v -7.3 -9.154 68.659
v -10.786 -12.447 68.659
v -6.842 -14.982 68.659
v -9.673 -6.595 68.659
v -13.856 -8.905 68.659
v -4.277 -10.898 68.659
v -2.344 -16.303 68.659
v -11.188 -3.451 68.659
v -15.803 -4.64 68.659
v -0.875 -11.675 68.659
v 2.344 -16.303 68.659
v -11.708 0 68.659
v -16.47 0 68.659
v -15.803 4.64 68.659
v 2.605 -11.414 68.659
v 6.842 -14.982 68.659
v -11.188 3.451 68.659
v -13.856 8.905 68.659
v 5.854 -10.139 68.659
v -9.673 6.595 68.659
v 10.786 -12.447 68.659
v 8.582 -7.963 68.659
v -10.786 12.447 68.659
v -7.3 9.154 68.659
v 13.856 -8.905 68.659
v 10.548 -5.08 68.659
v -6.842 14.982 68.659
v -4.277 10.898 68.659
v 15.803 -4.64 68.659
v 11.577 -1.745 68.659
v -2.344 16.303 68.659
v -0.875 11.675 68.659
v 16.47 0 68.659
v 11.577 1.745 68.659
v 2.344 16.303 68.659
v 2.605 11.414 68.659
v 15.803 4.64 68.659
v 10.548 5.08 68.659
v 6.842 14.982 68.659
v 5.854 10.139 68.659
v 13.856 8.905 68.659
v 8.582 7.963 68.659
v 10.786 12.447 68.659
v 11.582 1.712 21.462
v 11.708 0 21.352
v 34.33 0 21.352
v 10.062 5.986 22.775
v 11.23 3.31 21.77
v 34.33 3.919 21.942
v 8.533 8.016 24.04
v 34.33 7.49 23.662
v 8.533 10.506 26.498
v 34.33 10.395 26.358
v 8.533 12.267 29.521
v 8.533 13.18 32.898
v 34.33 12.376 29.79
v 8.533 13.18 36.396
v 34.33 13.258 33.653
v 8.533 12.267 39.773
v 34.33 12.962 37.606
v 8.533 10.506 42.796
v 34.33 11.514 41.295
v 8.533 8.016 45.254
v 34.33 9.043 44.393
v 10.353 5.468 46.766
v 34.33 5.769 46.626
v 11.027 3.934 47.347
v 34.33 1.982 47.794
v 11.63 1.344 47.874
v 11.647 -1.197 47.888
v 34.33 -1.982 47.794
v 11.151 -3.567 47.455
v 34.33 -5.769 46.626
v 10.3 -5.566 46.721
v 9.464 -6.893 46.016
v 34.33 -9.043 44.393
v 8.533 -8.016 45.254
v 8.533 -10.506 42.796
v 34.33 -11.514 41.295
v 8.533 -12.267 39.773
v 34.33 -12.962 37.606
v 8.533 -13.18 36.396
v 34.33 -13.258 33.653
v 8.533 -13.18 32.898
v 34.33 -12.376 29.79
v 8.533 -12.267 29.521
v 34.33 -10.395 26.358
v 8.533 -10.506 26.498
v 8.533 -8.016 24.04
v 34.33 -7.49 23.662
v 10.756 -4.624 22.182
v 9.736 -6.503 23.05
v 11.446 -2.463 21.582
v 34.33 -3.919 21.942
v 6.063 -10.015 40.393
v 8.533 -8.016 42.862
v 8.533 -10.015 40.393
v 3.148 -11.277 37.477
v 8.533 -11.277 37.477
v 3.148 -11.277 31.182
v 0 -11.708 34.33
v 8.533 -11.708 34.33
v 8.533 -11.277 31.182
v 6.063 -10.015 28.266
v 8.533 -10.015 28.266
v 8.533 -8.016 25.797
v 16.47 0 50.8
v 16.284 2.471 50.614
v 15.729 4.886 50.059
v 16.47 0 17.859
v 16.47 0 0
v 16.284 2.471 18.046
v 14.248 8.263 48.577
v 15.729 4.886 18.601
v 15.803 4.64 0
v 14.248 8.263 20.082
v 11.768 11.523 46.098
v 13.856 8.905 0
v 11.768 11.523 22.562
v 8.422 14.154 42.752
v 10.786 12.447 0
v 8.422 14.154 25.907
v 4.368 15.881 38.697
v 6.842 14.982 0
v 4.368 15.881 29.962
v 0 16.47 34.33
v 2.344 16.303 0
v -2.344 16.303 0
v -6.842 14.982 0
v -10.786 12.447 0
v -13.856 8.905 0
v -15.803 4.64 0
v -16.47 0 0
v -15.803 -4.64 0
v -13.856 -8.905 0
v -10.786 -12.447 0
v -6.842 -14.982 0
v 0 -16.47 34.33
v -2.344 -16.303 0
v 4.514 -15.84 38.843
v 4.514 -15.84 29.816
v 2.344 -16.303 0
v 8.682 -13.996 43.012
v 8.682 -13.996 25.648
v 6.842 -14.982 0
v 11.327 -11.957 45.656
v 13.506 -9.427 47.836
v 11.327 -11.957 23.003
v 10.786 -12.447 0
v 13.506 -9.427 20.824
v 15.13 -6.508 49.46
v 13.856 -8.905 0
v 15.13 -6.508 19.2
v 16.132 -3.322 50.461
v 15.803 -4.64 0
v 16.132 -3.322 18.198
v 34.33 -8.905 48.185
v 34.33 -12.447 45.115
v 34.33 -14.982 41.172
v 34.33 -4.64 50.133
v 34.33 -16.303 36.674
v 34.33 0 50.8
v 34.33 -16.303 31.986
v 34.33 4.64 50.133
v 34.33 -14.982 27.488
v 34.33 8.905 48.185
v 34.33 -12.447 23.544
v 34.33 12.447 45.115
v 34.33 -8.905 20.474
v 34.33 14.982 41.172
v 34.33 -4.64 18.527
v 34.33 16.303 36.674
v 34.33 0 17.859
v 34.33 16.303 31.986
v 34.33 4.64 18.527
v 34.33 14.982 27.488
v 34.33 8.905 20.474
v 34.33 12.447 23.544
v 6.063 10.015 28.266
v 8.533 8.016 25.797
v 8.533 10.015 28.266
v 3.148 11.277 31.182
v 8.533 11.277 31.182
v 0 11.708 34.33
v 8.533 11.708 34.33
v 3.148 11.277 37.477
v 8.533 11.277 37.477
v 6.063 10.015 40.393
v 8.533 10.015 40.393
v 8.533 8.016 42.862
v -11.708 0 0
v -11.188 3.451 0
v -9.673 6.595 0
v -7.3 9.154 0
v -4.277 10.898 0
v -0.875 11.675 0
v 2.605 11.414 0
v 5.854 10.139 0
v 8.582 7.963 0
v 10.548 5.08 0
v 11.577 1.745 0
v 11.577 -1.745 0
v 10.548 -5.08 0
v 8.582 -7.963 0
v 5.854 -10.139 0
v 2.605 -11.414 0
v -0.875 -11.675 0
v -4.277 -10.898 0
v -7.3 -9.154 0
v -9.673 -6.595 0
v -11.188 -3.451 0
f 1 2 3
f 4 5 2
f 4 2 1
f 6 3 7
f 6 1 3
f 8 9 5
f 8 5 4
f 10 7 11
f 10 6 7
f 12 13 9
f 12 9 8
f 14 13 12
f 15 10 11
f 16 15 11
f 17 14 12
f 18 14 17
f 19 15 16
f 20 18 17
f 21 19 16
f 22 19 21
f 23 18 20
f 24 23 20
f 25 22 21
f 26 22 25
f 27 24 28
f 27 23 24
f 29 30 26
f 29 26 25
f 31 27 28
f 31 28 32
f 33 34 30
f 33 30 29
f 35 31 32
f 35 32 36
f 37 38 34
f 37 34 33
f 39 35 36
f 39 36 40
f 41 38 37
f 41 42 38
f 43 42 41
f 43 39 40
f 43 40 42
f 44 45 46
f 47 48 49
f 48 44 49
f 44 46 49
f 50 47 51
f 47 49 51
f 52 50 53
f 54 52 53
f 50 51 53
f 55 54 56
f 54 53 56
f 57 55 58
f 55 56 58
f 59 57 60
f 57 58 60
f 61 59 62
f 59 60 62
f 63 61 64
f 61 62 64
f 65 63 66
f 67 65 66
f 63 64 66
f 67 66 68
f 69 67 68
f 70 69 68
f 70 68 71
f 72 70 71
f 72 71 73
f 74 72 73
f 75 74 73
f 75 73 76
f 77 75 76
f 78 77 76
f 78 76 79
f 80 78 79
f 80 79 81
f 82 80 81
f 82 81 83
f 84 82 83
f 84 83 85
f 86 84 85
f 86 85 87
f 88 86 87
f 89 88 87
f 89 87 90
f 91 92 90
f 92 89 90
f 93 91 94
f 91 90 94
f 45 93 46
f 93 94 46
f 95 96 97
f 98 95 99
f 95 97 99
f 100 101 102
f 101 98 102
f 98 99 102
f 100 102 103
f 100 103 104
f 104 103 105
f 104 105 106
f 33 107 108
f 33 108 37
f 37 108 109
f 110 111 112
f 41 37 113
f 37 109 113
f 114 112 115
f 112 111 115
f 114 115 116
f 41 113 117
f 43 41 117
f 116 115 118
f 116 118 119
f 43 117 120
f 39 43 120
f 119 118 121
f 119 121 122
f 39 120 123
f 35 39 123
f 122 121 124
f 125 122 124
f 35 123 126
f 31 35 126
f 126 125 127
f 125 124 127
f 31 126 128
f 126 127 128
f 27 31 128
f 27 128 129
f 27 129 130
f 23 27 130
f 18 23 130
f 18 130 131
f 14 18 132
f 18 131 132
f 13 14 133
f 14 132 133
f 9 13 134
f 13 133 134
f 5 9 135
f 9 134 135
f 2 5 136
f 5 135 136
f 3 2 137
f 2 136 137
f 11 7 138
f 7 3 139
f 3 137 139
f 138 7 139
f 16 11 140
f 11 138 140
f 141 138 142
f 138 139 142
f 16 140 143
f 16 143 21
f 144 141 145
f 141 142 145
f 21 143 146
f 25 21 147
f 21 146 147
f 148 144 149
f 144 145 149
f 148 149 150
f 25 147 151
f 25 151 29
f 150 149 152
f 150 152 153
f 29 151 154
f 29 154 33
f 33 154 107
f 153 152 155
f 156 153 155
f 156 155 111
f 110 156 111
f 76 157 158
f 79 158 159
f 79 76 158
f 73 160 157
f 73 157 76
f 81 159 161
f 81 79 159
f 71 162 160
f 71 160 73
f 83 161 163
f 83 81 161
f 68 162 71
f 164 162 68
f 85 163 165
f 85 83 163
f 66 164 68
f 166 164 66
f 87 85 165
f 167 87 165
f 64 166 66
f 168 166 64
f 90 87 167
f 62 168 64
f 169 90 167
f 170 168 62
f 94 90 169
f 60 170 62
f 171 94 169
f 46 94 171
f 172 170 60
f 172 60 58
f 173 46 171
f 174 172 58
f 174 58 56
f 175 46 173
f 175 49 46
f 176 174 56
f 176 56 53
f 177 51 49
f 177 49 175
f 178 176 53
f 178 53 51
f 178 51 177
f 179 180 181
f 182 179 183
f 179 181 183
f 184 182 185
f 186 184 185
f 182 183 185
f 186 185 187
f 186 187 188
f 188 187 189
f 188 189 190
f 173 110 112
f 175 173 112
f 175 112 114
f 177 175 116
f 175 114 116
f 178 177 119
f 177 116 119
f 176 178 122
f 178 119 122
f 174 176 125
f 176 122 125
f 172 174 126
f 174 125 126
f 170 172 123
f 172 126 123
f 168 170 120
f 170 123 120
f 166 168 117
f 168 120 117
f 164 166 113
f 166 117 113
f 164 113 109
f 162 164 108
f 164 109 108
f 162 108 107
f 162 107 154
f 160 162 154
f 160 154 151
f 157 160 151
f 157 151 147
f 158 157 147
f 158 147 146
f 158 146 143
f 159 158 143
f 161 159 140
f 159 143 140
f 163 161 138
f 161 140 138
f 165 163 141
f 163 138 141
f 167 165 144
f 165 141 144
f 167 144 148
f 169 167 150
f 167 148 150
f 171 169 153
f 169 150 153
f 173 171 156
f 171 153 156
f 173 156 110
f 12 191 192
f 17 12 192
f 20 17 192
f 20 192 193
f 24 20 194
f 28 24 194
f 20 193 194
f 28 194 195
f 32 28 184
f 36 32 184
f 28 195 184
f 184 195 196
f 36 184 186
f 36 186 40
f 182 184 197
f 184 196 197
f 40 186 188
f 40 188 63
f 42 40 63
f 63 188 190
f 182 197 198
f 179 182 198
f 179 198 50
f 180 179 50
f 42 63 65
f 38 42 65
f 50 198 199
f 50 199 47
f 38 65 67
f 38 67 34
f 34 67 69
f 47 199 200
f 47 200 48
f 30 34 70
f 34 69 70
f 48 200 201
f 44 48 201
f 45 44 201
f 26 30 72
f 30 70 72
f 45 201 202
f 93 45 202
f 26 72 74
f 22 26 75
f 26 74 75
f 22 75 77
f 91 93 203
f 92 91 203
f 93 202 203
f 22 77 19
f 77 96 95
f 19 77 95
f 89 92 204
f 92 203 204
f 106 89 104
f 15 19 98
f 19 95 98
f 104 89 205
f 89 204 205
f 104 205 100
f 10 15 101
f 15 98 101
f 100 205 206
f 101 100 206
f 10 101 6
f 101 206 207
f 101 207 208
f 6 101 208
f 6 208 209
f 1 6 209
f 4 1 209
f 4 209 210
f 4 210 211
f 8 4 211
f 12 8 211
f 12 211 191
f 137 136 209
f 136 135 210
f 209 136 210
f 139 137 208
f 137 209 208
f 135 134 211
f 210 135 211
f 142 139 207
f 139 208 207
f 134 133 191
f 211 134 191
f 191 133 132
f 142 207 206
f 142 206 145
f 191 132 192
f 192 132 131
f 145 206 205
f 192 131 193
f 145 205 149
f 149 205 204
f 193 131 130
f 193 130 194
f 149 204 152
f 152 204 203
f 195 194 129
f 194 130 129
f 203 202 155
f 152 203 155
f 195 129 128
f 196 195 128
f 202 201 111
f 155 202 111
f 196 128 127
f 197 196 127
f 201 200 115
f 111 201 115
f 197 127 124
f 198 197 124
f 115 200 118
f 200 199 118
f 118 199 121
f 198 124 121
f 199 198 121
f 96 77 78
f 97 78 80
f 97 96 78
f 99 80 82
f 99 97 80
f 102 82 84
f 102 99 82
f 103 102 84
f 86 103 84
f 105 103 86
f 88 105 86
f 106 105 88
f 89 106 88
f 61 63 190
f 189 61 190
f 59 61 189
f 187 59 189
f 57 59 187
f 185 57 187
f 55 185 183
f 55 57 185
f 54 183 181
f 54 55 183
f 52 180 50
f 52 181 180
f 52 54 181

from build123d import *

# Parameters (mm, degrees)
SKETCH1_R           = 16.4703125
BOSS_EXTRUDE1_DEPTH = 68.659375
SKETCH2_R           = 16.4703125
BOSS_EXTRUDE2_DEPTH = 34.3296875
SKETCH3_R           = 11.7078125
CUT_EXTRUDE1_DEPTH  = 34.3296875
SKETCH4_R           = 13.2953125
CUT_EXTRUDE2_DEPTH  = 25.796875
SKETCH5_R           = 11.7078125
CUT_EXTRUDE3_DEPTH  = 79.51056243


with BuildPart() as part:
    # Sketch1 → Boss-Extrude1 (new body)
    with BuildSketch(Plane.XY):
        Circle(SKETCH1_R)
    extrude(amount=BOSS_EXTRUDE1_DEPTH)

    # Sketch2 → Boss-Extrude2 (add)
    with BuildSketch(Plane(origin=(0, 0, 0), x_dir=(0, 0, -1), z_dir=(1, 0, 0))):
        with Locations((-34.3296875, 0)):
            Circle(SKETCH2_R)
    extrude(amount=BOSS_EXTRUDE2_DEPTH)

    # Sketch3 → Cut-Extrude1 (cut)
    with BuildSketch(Plane(origin=(34.3296875, 0, 0), x_dir=(0, 0, -1), z_dir=(1, 0, 0))):
        with Locations((-34.3296875, 0)):
            Circle(SKETCH3_R)
    extrude(amount=-CUT_EXTRUDE1_DEPTH, mode=Mode.SUBTRACT)

    # Sketch4 → Cut-Extrude2 (cut)
    with BuildSketch(Plane(origin=(34.3296875, 0, 0), x_dir=(0, 0, -1), z_dir=(1, 0, 0))):
        with Locations((-34.647030574, 0)):
            Circle(SKETCH4_R)
    extrude(amount=-CUT_EXTRUDE2_DEPTH, mode=Mode.SUBTRACT)

    # Sketch5 → Cut-Extrude3 (cut, through all)
    with BuildSketch(Plane(origin=(0, 0, 0), x_dir=(-1, 0, 0), z_dir=(0, 0, -1))):
        Circle(SKETCH5_R)
    extrude(amount=-CUT_EXTRUDE3_DEPTH, mode=Mode.SUBTRACT)


solid = part.part
